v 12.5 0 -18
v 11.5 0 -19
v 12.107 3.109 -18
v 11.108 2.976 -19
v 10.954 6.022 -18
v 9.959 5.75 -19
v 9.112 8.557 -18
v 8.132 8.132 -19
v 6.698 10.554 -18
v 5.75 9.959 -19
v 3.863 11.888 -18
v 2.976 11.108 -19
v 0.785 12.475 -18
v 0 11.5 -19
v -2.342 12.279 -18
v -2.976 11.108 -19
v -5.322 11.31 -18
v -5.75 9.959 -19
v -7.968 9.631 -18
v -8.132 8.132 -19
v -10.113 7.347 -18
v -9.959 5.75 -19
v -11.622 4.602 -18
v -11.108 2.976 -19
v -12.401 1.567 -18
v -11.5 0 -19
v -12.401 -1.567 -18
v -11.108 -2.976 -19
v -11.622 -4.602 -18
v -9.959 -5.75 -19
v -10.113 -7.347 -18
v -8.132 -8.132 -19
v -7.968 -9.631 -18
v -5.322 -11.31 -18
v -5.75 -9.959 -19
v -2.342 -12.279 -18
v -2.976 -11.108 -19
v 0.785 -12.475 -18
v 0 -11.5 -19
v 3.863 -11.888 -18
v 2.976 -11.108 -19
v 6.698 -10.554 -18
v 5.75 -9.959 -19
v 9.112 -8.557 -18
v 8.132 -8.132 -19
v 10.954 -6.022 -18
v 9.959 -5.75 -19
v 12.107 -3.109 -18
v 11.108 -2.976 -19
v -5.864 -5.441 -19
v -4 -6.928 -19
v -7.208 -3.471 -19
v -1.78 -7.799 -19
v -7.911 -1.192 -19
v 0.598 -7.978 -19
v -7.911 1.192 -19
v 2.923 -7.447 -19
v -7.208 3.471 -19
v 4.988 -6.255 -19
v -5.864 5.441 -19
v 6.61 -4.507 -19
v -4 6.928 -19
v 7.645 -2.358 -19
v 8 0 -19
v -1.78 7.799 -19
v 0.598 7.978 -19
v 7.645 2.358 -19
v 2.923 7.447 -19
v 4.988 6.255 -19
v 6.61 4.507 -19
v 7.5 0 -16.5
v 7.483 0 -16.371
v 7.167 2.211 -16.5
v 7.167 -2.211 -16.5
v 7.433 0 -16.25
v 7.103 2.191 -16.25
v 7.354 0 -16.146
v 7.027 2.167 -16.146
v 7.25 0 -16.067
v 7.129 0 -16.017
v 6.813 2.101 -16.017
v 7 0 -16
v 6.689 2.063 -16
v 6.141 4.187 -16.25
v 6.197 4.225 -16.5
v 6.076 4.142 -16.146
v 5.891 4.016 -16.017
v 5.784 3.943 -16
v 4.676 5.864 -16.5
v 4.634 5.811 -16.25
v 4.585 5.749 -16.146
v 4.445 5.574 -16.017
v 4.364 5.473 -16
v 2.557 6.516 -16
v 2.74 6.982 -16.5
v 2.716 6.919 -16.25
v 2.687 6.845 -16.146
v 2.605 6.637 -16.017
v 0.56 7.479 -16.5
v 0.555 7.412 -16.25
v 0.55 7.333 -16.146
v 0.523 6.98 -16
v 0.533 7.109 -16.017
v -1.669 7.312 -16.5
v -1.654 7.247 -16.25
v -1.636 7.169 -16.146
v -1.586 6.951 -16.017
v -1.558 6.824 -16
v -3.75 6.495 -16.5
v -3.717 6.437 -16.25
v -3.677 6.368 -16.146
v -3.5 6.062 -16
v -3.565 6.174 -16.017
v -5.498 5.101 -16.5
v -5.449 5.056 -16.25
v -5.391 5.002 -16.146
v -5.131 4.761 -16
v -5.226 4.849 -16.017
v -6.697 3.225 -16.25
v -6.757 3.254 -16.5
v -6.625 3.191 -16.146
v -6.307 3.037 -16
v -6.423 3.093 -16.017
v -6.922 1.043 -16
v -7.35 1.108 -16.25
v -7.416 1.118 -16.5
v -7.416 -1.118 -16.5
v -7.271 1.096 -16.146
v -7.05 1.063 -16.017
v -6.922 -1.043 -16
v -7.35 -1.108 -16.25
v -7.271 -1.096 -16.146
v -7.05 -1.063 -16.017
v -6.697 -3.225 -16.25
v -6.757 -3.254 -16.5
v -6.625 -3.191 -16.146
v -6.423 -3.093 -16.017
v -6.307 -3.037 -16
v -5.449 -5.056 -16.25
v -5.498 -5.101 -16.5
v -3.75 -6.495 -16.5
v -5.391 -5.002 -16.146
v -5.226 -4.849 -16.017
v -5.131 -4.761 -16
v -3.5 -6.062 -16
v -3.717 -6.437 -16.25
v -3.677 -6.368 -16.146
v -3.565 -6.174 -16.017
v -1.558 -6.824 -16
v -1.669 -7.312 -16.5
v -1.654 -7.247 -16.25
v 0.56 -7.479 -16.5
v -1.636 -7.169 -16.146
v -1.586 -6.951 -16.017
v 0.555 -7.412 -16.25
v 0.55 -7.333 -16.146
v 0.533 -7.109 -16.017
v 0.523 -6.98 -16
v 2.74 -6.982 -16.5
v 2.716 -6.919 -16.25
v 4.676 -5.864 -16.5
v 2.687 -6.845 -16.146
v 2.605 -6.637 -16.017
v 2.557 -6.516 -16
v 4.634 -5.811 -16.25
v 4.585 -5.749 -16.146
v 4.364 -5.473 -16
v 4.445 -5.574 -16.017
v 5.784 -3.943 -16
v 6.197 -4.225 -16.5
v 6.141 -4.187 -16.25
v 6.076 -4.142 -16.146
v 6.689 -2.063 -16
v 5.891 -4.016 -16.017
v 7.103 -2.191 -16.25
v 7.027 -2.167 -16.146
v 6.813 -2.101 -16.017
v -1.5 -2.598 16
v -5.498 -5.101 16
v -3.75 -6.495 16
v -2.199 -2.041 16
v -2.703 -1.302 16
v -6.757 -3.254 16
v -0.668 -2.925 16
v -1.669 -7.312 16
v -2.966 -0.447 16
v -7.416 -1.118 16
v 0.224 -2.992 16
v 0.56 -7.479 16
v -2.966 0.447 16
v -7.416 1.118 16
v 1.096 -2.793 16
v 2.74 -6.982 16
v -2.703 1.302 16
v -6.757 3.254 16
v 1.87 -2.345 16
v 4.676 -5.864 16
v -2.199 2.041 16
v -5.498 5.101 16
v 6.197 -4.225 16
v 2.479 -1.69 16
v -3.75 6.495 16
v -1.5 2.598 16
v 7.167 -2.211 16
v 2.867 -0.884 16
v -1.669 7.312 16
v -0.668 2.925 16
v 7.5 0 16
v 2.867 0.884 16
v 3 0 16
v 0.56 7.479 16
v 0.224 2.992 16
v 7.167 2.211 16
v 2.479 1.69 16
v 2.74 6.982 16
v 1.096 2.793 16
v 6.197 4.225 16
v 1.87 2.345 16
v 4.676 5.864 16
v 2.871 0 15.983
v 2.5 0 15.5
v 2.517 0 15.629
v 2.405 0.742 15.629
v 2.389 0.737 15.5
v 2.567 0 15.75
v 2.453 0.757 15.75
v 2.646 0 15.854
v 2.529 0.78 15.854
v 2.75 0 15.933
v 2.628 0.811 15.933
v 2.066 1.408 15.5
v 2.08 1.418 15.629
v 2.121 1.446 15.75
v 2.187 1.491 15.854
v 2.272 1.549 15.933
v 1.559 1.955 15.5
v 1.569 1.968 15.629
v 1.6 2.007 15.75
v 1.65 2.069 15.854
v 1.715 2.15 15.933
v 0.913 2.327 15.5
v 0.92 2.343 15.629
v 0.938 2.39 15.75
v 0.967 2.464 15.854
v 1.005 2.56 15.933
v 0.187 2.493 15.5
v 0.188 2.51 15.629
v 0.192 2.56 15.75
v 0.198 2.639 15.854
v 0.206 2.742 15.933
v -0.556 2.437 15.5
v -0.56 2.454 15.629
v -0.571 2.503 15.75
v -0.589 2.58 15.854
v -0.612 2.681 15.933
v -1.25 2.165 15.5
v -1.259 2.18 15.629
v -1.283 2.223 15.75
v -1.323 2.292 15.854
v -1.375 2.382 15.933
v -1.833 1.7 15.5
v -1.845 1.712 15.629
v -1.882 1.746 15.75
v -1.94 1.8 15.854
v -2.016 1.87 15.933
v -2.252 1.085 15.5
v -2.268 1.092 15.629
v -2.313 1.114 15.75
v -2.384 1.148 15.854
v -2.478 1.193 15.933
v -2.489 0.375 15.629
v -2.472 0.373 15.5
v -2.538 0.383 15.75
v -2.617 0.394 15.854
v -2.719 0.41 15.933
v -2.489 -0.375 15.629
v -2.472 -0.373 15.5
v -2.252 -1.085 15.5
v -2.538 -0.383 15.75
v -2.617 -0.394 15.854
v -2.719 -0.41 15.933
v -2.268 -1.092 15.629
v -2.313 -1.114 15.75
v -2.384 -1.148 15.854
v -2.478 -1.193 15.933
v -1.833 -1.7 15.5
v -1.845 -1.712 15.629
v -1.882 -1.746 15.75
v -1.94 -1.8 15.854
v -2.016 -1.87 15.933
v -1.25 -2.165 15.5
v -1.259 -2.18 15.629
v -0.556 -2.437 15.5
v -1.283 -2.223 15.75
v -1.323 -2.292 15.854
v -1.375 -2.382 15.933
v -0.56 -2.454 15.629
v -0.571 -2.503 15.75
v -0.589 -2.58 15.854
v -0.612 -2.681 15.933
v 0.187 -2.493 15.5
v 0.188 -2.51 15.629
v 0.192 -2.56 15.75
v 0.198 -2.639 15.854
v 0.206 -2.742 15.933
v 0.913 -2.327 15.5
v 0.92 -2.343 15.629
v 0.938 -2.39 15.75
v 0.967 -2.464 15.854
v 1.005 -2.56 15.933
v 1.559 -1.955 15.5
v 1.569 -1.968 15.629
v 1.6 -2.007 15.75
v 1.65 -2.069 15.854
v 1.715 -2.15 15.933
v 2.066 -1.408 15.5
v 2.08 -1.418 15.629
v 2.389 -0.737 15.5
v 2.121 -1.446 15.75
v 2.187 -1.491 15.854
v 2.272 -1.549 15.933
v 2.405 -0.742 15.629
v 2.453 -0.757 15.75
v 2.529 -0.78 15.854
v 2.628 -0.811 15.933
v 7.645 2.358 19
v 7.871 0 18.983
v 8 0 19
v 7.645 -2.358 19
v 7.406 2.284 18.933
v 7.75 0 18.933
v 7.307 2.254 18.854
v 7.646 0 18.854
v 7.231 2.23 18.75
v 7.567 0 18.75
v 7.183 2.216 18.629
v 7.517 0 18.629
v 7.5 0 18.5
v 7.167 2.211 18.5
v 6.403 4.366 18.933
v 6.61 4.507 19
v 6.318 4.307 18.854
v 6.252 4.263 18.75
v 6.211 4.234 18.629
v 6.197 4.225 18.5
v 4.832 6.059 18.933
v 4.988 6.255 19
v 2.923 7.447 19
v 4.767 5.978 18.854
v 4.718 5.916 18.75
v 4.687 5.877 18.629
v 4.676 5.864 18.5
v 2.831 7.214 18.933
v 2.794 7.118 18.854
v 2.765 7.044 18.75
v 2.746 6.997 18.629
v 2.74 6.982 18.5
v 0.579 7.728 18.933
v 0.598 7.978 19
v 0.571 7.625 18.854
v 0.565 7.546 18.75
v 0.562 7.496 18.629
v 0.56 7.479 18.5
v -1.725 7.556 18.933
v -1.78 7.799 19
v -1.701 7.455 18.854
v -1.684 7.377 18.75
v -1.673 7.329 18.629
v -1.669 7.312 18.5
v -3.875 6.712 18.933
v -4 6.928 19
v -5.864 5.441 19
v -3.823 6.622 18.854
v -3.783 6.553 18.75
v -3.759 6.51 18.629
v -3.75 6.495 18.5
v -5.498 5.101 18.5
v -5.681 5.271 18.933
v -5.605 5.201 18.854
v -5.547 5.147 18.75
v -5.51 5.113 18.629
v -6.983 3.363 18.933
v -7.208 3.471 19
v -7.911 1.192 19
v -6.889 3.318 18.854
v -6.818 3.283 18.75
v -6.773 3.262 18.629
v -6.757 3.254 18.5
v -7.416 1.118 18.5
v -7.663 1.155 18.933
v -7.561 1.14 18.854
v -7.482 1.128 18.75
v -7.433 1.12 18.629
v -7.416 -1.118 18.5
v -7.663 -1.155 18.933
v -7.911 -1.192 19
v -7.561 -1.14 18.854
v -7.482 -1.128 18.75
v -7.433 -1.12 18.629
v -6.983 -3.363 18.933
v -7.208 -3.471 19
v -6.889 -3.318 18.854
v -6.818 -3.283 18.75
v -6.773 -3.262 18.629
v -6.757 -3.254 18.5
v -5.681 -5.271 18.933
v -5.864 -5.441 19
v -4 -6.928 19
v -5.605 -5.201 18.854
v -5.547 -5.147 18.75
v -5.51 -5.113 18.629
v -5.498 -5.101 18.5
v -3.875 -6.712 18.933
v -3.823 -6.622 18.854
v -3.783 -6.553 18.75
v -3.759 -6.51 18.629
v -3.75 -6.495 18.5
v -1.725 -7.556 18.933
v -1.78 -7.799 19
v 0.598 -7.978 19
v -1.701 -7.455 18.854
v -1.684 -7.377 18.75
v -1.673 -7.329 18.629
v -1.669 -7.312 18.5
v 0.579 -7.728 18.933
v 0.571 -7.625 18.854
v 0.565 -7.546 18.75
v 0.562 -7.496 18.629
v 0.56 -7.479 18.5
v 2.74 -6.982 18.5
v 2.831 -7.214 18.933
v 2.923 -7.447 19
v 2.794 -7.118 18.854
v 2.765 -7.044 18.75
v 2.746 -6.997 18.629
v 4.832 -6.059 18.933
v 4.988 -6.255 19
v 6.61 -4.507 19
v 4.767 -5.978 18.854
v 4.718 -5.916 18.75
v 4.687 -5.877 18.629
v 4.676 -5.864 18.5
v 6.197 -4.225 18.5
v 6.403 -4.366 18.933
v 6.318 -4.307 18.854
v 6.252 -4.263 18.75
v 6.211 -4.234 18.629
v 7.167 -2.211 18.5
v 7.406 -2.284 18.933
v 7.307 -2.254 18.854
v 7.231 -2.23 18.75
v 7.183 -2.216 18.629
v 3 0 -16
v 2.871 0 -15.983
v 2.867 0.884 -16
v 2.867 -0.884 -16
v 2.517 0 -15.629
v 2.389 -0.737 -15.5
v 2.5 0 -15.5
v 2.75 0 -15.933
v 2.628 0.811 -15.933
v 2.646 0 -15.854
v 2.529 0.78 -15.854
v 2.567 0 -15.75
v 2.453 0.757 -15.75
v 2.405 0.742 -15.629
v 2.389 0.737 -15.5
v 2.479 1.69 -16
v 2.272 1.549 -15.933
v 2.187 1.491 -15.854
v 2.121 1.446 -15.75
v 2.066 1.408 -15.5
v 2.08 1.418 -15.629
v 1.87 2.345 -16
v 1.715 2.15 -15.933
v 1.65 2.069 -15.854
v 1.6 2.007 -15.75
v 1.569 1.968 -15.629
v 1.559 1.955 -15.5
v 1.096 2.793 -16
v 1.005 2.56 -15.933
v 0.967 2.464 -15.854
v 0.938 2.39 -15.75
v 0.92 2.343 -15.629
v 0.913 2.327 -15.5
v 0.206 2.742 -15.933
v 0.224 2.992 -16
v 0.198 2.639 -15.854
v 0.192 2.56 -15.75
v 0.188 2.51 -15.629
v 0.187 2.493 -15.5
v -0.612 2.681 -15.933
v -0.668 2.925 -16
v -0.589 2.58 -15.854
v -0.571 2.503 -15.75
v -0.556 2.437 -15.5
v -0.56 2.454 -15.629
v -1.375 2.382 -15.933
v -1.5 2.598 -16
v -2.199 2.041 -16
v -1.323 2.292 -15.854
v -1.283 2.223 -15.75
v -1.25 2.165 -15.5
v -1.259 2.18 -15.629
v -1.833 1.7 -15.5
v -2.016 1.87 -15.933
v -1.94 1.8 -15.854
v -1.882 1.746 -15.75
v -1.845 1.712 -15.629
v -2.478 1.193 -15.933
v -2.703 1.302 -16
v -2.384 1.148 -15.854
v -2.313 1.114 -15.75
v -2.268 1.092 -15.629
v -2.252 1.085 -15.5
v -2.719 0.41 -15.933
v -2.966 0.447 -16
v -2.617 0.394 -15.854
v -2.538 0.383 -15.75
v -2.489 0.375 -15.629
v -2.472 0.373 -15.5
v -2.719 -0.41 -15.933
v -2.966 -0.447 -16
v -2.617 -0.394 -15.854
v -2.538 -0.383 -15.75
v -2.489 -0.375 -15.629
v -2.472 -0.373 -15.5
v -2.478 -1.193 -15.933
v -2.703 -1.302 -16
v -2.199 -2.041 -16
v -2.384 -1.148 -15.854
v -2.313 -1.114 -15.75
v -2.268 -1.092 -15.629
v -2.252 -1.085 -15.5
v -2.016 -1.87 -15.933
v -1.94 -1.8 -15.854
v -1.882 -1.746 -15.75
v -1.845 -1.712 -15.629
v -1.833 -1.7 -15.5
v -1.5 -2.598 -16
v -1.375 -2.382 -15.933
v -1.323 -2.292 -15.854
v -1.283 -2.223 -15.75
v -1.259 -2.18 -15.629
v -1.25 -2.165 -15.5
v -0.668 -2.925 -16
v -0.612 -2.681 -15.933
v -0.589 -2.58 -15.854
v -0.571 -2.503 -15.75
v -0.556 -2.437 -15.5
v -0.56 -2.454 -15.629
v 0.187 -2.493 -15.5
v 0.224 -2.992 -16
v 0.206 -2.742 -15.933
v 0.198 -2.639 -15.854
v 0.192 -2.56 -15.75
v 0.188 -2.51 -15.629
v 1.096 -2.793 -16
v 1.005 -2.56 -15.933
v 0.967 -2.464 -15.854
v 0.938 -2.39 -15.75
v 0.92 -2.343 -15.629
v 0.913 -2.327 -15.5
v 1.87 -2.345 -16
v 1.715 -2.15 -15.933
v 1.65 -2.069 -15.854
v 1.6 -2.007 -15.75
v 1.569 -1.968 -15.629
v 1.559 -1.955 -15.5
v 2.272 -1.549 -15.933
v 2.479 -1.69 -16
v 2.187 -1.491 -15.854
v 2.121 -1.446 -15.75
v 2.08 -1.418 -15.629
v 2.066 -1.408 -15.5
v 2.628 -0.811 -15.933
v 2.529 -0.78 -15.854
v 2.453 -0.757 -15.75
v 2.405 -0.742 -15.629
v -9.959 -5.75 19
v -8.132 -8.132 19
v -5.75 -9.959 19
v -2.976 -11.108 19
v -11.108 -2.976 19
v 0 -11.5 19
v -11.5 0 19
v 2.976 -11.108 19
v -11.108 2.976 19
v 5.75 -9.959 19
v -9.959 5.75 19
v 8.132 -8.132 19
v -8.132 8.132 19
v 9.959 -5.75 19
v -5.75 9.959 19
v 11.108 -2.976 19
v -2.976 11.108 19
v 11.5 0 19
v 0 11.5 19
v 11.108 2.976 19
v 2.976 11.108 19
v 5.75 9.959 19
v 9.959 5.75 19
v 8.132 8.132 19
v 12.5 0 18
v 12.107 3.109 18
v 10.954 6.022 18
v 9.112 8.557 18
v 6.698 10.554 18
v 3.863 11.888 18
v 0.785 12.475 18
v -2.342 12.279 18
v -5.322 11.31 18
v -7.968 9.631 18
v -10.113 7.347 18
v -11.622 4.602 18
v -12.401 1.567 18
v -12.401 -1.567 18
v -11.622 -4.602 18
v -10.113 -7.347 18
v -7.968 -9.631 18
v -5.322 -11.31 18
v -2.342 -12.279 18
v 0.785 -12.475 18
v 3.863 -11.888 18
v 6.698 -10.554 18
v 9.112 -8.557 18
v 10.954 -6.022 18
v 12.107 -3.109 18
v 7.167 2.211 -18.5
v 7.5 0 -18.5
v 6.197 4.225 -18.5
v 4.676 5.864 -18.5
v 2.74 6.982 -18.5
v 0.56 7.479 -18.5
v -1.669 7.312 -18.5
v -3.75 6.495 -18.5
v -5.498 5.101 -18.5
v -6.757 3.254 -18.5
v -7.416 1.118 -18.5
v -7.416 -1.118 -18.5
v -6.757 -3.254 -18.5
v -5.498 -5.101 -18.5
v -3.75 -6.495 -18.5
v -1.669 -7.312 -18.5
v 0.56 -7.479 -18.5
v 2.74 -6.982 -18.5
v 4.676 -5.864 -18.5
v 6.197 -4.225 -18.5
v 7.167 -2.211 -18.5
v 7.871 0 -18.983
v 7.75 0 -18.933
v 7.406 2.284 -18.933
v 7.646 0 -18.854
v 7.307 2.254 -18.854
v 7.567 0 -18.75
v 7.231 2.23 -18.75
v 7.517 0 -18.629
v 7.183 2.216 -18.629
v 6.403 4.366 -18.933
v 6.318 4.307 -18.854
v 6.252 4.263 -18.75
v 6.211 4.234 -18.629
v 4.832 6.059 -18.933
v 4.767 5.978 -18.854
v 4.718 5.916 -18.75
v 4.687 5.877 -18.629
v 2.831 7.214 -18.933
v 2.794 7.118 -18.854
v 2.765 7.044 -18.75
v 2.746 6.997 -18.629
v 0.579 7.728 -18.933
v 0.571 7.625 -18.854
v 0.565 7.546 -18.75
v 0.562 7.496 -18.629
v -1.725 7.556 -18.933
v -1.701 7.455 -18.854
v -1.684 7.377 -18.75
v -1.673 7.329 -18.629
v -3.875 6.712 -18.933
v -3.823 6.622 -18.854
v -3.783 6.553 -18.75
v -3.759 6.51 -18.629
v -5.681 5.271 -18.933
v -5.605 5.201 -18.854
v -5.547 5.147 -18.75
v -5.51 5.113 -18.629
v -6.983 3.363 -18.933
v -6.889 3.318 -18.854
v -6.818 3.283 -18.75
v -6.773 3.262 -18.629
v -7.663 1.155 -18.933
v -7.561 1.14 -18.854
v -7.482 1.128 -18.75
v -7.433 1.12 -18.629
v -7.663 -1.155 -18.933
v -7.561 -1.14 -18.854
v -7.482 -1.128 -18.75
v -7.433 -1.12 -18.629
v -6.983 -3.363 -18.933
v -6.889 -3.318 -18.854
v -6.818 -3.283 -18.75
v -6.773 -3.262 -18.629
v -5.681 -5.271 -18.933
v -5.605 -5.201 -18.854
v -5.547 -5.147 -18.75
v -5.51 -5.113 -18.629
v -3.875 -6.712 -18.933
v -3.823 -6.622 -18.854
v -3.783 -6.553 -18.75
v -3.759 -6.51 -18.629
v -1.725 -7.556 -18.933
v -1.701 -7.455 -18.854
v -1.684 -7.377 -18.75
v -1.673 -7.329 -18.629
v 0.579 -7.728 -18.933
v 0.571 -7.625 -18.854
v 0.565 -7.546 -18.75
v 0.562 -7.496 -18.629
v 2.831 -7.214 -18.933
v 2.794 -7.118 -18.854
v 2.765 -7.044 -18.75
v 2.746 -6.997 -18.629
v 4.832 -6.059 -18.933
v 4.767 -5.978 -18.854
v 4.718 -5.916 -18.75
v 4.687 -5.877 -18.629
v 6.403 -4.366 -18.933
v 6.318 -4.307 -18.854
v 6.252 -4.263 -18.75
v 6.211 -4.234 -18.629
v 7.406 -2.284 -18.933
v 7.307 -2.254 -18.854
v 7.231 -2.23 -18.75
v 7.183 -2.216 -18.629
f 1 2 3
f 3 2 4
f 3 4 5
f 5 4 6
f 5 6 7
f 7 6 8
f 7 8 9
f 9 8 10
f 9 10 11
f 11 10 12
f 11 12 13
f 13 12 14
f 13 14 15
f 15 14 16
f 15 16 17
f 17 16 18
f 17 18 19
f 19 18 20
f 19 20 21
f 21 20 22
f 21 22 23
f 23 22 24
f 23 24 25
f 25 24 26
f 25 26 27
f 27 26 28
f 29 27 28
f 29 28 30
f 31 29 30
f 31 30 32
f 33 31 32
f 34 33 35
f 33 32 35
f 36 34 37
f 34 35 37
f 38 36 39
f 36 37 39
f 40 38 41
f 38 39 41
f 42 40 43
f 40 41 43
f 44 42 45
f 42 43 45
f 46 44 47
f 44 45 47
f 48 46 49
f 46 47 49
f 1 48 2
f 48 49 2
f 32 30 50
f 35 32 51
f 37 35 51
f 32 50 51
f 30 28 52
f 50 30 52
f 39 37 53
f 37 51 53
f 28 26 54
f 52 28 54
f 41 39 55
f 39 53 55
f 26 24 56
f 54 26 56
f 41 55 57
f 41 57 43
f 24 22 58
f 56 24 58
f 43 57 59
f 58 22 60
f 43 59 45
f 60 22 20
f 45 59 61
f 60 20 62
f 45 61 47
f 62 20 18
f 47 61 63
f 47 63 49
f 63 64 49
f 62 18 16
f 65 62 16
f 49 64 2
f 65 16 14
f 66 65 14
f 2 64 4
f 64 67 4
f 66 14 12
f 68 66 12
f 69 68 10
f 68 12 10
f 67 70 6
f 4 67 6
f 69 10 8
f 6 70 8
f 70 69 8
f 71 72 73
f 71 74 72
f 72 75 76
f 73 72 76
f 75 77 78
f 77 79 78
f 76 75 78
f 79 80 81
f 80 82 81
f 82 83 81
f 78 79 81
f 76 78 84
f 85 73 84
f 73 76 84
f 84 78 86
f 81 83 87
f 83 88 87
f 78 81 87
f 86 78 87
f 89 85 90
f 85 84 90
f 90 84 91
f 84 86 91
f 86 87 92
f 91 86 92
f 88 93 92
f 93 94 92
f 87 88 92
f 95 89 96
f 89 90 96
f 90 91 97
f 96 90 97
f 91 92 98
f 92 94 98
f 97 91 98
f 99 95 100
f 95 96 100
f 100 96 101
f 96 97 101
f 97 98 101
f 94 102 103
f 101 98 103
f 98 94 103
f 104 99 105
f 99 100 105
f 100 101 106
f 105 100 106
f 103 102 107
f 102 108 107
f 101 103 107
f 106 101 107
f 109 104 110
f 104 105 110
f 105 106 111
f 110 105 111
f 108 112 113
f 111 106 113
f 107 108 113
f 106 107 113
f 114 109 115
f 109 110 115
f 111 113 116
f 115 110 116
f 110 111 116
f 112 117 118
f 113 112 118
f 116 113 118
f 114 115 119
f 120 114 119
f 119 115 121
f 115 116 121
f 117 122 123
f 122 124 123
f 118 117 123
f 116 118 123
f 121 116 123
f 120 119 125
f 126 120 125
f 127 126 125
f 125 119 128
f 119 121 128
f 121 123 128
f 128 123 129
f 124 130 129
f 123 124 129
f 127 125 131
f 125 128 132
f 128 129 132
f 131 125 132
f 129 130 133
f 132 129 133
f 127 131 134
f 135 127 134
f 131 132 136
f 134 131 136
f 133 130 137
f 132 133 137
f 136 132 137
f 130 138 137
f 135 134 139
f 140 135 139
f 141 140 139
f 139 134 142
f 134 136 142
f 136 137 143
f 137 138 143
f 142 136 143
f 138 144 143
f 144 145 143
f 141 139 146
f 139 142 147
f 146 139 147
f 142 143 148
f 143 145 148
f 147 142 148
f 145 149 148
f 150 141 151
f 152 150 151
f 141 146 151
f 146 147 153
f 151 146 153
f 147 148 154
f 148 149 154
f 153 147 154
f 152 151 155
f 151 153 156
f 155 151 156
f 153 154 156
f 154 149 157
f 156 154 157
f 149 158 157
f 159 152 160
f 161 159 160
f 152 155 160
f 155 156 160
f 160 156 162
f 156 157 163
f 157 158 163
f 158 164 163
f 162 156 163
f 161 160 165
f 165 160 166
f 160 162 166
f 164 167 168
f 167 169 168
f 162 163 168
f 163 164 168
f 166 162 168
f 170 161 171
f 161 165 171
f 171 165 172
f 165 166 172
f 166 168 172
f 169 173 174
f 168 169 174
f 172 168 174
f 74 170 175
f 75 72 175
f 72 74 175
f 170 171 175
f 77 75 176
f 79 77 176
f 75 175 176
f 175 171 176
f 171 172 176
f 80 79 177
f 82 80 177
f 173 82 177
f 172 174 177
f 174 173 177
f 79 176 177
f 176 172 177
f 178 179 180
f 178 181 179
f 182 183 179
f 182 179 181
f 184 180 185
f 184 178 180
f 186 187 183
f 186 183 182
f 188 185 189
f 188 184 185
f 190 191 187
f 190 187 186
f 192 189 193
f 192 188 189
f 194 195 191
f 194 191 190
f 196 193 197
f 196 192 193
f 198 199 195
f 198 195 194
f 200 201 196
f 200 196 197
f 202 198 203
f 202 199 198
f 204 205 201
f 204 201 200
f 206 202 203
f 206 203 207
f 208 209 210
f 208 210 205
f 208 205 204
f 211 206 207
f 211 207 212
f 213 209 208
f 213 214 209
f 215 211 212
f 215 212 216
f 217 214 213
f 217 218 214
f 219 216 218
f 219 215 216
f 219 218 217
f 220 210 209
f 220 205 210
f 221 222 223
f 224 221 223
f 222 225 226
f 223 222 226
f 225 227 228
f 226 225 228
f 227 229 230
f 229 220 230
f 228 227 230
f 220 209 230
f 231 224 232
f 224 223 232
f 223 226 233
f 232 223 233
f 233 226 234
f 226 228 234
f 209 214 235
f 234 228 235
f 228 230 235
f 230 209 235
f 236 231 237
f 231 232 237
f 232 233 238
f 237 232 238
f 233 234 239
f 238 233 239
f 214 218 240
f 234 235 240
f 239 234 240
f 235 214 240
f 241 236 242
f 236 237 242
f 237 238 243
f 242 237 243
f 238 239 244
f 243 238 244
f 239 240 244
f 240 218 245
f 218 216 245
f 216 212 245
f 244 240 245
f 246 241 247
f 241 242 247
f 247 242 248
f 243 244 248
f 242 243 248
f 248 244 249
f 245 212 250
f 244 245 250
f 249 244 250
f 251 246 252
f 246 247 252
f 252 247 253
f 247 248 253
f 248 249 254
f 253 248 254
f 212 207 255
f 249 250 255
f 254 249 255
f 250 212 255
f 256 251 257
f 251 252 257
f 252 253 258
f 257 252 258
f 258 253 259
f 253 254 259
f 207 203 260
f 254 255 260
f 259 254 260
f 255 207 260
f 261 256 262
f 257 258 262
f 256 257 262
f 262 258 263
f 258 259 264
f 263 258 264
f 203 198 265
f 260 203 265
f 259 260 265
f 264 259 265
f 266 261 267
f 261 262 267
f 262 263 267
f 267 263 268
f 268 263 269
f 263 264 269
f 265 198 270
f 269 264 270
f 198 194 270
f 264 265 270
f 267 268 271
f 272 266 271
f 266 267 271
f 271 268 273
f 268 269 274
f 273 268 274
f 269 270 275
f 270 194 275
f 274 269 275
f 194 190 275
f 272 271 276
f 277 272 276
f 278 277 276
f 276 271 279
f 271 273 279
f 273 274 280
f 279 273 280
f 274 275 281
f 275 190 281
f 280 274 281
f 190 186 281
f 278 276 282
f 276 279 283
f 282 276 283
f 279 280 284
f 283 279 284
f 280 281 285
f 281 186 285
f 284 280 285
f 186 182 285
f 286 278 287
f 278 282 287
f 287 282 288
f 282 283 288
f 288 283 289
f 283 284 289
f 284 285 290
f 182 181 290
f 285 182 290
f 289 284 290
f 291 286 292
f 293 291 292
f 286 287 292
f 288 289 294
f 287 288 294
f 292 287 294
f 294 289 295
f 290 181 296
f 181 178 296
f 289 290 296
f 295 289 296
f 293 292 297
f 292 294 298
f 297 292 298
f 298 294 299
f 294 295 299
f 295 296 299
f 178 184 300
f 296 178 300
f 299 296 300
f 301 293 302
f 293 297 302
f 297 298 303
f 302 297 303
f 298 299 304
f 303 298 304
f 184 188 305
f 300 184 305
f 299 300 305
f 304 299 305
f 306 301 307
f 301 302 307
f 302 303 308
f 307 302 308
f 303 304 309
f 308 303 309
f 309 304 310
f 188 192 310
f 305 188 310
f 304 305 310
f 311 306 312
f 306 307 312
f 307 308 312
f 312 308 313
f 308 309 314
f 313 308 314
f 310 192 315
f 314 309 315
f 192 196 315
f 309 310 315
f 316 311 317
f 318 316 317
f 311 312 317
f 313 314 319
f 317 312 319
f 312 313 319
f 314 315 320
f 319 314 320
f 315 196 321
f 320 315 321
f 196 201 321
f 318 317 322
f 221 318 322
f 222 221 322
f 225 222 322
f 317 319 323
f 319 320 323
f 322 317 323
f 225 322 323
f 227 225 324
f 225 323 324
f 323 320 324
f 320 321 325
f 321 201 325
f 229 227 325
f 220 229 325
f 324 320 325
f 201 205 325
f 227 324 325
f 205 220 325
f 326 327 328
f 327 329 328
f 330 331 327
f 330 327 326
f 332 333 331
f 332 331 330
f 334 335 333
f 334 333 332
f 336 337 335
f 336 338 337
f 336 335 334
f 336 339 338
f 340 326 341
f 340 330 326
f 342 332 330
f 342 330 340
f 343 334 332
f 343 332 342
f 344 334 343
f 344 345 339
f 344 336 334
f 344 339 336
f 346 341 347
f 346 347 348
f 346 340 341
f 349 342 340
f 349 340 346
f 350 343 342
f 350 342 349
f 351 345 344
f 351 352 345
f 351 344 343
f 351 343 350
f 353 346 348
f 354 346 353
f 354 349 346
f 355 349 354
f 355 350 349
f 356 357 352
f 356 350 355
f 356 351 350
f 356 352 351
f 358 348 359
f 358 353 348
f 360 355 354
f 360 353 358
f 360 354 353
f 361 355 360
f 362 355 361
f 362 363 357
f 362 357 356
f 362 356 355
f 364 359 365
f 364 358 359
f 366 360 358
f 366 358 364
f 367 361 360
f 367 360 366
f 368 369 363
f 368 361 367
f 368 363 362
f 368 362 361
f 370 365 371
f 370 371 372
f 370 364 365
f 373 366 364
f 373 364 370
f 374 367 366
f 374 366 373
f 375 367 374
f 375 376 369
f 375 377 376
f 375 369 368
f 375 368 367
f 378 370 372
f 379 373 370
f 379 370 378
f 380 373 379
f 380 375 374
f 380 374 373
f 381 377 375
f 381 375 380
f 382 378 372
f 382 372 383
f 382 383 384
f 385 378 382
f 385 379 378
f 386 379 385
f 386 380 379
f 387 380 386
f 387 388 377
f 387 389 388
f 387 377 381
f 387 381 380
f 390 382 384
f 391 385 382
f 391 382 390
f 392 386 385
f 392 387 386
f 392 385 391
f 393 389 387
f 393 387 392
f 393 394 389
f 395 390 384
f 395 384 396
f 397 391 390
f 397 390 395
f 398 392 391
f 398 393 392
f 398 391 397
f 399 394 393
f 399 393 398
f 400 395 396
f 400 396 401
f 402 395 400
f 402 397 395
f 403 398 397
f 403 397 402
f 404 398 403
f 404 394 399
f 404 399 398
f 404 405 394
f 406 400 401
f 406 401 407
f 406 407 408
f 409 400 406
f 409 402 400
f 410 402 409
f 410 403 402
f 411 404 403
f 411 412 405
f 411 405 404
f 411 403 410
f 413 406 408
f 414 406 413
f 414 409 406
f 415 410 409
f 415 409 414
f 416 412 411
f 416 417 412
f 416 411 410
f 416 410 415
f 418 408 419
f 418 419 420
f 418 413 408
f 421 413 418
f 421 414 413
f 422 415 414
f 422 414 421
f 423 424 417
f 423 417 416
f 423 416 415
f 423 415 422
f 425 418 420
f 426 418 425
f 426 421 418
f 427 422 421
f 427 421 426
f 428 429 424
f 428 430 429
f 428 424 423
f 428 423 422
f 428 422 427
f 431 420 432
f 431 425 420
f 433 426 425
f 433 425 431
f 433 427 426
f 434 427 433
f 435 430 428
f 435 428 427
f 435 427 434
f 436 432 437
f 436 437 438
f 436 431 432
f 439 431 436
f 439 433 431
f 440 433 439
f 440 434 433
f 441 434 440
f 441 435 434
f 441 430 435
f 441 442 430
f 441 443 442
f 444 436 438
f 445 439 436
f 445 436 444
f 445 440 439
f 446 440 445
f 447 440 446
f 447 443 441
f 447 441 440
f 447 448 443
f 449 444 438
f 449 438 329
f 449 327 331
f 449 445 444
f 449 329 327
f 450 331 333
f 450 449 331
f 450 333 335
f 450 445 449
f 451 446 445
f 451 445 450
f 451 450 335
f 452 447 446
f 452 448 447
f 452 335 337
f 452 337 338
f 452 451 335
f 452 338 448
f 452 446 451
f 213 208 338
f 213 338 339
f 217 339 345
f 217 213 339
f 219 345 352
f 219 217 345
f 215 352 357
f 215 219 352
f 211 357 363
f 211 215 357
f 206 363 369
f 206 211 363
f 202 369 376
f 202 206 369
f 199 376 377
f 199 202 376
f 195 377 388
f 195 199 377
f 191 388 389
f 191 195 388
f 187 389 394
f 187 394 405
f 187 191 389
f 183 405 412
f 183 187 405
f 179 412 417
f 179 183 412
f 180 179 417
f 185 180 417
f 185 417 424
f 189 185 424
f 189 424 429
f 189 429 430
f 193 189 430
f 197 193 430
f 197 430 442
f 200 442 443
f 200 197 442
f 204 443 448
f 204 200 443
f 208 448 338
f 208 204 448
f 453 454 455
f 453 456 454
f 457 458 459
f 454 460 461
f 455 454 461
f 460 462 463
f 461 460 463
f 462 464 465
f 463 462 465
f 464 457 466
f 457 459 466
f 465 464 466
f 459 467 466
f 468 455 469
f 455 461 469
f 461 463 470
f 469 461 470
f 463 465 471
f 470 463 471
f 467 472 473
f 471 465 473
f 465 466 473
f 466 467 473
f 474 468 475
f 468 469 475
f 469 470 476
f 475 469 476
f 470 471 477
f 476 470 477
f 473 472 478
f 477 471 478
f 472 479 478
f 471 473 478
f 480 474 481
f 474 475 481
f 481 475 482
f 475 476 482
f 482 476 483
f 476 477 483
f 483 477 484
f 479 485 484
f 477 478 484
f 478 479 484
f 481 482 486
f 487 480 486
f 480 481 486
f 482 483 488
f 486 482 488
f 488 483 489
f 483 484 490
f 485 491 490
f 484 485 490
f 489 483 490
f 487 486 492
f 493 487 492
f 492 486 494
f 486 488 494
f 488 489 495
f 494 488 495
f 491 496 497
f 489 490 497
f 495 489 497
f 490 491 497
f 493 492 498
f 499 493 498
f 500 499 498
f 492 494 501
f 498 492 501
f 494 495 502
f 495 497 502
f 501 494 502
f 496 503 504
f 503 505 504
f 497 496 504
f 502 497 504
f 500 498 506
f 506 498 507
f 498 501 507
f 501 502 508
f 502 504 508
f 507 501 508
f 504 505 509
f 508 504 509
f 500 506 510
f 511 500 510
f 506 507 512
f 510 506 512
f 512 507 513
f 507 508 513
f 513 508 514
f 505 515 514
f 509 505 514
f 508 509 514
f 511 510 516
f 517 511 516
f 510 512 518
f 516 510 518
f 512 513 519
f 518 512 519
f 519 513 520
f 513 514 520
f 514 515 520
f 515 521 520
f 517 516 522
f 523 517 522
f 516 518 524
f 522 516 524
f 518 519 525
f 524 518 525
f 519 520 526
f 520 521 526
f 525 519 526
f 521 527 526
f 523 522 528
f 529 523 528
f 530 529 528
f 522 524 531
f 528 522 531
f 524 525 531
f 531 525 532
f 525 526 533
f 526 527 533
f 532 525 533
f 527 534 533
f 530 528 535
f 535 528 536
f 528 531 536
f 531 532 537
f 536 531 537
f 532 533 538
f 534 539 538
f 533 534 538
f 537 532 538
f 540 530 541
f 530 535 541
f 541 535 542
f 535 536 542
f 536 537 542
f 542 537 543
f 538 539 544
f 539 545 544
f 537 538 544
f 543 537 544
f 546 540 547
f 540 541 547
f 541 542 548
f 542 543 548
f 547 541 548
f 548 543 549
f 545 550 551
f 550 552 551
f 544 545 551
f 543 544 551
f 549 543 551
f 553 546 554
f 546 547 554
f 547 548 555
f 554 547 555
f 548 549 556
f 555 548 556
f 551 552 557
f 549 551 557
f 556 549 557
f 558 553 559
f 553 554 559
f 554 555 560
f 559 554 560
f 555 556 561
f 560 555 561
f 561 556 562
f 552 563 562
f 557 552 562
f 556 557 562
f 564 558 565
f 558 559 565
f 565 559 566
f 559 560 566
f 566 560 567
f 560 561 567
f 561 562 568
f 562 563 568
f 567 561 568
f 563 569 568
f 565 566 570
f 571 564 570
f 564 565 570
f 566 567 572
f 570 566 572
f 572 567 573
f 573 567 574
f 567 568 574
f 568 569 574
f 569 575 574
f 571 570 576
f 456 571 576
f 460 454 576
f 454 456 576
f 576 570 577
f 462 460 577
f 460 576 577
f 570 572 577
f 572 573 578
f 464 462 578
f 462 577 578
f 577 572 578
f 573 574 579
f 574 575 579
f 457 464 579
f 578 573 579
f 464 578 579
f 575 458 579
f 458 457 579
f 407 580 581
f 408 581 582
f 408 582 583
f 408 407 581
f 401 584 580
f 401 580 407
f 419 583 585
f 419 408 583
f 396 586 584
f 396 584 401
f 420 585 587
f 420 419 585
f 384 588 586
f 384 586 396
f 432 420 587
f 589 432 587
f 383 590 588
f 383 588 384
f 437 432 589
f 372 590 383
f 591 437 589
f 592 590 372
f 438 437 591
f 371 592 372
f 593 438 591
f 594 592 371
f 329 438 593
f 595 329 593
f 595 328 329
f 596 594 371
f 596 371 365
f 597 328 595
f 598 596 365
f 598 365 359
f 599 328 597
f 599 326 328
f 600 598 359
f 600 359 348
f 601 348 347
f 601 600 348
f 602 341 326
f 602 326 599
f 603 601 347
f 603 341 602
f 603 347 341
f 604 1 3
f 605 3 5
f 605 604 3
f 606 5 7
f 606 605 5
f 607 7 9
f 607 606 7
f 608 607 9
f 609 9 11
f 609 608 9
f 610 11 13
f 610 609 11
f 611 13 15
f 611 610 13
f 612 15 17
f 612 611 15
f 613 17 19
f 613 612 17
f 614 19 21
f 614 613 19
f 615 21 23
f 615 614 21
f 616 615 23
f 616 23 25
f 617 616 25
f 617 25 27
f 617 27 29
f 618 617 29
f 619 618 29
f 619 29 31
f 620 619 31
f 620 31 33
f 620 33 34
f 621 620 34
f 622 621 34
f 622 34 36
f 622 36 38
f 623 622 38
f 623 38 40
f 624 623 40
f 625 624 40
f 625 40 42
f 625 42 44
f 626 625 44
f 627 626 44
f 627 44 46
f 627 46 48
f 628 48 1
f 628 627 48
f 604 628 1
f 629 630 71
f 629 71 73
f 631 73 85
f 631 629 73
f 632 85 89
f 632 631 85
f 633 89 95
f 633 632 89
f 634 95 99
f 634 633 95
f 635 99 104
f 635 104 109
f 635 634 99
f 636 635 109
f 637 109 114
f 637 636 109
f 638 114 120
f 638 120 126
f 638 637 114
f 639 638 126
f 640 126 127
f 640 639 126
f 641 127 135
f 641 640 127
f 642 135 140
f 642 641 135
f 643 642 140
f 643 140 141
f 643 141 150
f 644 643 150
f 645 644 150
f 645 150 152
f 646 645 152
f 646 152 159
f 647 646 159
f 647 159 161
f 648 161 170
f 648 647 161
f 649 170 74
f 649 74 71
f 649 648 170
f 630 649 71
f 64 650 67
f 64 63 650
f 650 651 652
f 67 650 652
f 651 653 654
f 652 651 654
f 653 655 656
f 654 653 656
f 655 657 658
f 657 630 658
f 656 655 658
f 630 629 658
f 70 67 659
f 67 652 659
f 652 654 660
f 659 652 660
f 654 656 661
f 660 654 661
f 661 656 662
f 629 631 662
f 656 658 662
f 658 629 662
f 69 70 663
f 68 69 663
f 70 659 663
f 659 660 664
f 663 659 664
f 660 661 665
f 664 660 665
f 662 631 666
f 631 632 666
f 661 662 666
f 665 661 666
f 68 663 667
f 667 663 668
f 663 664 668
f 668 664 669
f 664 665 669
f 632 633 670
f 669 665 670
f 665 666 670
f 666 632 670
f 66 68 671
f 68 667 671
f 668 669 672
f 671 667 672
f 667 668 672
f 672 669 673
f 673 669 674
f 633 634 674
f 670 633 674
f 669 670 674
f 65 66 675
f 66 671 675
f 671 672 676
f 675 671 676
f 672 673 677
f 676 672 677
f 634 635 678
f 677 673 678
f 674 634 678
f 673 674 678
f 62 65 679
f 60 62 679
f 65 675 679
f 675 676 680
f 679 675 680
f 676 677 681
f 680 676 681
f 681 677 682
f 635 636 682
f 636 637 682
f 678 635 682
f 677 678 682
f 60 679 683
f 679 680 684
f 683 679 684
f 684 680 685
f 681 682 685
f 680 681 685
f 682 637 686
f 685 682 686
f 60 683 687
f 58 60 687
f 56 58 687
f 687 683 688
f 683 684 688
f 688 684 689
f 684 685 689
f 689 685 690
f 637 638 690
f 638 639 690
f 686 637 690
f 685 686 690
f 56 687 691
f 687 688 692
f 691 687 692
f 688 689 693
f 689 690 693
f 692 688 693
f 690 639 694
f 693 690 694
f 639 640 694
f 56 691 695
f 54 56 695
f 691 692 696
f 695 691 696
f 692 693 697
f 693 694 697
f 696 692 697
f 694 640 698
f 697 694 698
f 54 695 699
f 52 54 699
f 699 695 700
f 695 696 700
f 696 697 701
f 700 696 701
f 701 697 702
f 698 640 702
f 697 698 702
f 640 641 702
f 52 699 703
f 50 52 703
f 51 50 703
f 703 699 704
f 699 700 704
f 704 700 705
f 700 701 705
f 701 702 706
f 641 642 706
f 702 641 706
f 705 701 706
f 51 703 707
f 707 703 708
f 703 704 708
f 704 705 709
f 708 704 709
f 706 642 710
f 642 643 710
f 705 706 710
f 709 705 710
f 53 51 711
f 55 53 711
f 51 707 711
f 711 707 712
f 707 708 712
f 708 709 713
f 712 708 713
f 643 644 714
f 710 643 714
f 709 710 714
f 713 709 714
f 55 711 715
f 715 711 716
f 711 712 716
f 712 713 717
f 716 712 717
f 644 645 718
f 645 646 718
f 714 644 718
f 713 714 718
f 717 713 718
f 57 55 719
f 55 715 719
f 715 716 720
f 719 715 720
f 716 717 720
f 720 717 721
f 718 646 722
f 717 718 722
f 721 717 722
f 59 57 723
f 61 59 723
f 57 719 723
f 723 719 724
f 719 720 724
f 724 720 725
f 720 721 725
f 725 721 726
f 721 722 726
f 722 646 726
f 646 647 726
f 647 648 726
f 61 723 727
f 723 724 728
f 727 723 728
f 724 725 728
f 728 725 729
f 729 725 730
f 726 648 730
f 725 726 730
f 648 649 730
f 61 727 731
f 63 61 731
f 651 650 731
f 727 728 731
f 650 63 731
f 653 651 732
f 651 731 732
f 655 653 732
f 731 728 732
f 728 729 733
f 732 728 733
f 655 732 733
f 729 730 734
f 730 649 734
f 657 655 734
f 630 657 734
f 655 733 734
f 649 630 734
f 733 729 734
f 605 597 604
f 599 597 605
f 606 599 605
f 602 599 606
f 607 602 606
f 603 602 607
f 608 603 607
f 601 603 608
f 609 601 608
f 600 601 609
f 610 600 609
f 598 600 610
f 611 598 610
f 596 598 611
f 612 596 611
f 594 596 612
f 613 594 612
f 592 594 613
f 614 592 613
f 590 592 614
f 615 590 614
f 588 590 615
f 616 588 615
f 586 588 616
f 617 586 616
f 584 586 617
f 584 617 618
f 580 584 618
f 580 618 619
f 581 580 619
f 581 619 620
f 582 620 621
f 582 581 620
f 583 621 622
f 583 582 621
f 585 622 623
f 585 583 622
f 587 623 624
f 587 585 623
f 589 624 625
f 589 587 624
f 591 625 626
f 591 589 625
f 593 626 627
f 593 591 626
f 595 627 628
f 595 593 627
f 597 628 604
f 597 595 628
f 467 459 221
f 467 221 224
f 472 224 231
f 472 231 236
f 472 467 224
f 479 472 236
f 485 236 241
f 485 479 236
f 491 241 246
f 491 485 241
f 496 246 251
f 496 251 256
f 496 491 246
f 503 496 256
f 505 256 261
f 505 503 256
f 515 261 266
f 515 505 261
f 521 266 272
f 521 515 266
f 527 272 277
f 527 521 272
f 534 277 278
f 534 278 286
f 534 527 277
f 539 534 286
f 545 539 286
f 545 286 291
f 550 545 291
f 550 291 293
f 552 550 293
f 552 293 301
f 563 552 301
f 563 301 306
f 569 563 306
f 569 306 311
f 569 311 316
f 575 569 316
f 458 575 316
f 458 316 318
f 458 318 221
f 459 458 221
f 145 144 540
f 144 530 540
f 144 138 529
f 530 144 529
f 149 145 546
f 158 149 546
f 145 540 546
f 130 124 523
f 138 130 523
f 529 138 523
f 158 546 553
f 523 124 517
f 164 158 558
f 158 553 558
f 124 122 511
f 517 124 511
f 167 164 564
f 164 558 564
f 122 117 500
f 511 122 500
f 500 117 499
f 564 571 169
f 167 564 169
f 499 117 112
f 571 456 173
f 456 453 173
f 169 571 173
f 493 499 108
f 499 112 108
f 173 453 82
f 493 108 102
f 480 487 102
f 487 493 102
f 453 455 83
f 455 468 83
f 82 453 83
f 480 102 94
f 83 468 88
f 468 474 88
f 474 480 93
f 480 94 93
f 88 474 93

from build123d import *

# Parameters (mm, degrees)
SKETCH1_R           = 12.5
SKETCH1_R_2         = 7.5
BOSS_EXTRUDE2_DEPTH = 19
SKETCH1_4_R         = 7.5
SKETCH1_4_R_2       = 2.5
BOSS_EXTRUDE3_DEPTH = 16
CHAMFER1_SIZE       = 1
FILLET1_R           = 0.5
FILLET2_R           = 0.5


with BuildPart() as part:
    # Sketch1 → Boss-Extrude2 (new, symmetric)
    with BuildSketch(Plane.XY):
        Circle(SKETCH1_R)
        Circle(SKETCH1_R_2, mode=Mode.SUBTRACT)
    extrude(amount=BOSS_EXTRUDE2_DEPTH, both=True)

    # Sketch1<4> → Boss-Extrude3 (add, symmetric)
    with BuildSketch(Plane.XY):
        Circle(SKETCH1_4_R)
        Circle(SKETCH1_4_R_2, mode=Mode.SUBTRACT)
    extrude(amount=BOSS_EXTRUDE3_DEPTH, both=True)

    # Chamfer1
    chamfer1_edges = [part.edges().sort_by_distance(p)[0] for p in [
        (-12.5, 0, 19),
        (-12.5, 0, -19),
    ]]
    chamfer(chamfer1_edges, length=CHAMFER1_SIZE)

    # Fillet1
    fillet1_edges = [part.edges().sort_by_distance(p)[0] for p in [
        (-7.5, 0, -16),
        (-2.5, 0, -16),
        (-7.5, 0, -19),
        (-7.5, 0, 19),
    ]]
    fillet(fillet1_edges, radius=FILLET1_R)

    # Fillet2
    fillet2_edges = [part.edges().sort_by_distance(p)[0] for p in [
        (-2.5, 0, 16),
    ]]
    fillet(fillet2_edges, radius=FILLET2_R)


solid = part.part
